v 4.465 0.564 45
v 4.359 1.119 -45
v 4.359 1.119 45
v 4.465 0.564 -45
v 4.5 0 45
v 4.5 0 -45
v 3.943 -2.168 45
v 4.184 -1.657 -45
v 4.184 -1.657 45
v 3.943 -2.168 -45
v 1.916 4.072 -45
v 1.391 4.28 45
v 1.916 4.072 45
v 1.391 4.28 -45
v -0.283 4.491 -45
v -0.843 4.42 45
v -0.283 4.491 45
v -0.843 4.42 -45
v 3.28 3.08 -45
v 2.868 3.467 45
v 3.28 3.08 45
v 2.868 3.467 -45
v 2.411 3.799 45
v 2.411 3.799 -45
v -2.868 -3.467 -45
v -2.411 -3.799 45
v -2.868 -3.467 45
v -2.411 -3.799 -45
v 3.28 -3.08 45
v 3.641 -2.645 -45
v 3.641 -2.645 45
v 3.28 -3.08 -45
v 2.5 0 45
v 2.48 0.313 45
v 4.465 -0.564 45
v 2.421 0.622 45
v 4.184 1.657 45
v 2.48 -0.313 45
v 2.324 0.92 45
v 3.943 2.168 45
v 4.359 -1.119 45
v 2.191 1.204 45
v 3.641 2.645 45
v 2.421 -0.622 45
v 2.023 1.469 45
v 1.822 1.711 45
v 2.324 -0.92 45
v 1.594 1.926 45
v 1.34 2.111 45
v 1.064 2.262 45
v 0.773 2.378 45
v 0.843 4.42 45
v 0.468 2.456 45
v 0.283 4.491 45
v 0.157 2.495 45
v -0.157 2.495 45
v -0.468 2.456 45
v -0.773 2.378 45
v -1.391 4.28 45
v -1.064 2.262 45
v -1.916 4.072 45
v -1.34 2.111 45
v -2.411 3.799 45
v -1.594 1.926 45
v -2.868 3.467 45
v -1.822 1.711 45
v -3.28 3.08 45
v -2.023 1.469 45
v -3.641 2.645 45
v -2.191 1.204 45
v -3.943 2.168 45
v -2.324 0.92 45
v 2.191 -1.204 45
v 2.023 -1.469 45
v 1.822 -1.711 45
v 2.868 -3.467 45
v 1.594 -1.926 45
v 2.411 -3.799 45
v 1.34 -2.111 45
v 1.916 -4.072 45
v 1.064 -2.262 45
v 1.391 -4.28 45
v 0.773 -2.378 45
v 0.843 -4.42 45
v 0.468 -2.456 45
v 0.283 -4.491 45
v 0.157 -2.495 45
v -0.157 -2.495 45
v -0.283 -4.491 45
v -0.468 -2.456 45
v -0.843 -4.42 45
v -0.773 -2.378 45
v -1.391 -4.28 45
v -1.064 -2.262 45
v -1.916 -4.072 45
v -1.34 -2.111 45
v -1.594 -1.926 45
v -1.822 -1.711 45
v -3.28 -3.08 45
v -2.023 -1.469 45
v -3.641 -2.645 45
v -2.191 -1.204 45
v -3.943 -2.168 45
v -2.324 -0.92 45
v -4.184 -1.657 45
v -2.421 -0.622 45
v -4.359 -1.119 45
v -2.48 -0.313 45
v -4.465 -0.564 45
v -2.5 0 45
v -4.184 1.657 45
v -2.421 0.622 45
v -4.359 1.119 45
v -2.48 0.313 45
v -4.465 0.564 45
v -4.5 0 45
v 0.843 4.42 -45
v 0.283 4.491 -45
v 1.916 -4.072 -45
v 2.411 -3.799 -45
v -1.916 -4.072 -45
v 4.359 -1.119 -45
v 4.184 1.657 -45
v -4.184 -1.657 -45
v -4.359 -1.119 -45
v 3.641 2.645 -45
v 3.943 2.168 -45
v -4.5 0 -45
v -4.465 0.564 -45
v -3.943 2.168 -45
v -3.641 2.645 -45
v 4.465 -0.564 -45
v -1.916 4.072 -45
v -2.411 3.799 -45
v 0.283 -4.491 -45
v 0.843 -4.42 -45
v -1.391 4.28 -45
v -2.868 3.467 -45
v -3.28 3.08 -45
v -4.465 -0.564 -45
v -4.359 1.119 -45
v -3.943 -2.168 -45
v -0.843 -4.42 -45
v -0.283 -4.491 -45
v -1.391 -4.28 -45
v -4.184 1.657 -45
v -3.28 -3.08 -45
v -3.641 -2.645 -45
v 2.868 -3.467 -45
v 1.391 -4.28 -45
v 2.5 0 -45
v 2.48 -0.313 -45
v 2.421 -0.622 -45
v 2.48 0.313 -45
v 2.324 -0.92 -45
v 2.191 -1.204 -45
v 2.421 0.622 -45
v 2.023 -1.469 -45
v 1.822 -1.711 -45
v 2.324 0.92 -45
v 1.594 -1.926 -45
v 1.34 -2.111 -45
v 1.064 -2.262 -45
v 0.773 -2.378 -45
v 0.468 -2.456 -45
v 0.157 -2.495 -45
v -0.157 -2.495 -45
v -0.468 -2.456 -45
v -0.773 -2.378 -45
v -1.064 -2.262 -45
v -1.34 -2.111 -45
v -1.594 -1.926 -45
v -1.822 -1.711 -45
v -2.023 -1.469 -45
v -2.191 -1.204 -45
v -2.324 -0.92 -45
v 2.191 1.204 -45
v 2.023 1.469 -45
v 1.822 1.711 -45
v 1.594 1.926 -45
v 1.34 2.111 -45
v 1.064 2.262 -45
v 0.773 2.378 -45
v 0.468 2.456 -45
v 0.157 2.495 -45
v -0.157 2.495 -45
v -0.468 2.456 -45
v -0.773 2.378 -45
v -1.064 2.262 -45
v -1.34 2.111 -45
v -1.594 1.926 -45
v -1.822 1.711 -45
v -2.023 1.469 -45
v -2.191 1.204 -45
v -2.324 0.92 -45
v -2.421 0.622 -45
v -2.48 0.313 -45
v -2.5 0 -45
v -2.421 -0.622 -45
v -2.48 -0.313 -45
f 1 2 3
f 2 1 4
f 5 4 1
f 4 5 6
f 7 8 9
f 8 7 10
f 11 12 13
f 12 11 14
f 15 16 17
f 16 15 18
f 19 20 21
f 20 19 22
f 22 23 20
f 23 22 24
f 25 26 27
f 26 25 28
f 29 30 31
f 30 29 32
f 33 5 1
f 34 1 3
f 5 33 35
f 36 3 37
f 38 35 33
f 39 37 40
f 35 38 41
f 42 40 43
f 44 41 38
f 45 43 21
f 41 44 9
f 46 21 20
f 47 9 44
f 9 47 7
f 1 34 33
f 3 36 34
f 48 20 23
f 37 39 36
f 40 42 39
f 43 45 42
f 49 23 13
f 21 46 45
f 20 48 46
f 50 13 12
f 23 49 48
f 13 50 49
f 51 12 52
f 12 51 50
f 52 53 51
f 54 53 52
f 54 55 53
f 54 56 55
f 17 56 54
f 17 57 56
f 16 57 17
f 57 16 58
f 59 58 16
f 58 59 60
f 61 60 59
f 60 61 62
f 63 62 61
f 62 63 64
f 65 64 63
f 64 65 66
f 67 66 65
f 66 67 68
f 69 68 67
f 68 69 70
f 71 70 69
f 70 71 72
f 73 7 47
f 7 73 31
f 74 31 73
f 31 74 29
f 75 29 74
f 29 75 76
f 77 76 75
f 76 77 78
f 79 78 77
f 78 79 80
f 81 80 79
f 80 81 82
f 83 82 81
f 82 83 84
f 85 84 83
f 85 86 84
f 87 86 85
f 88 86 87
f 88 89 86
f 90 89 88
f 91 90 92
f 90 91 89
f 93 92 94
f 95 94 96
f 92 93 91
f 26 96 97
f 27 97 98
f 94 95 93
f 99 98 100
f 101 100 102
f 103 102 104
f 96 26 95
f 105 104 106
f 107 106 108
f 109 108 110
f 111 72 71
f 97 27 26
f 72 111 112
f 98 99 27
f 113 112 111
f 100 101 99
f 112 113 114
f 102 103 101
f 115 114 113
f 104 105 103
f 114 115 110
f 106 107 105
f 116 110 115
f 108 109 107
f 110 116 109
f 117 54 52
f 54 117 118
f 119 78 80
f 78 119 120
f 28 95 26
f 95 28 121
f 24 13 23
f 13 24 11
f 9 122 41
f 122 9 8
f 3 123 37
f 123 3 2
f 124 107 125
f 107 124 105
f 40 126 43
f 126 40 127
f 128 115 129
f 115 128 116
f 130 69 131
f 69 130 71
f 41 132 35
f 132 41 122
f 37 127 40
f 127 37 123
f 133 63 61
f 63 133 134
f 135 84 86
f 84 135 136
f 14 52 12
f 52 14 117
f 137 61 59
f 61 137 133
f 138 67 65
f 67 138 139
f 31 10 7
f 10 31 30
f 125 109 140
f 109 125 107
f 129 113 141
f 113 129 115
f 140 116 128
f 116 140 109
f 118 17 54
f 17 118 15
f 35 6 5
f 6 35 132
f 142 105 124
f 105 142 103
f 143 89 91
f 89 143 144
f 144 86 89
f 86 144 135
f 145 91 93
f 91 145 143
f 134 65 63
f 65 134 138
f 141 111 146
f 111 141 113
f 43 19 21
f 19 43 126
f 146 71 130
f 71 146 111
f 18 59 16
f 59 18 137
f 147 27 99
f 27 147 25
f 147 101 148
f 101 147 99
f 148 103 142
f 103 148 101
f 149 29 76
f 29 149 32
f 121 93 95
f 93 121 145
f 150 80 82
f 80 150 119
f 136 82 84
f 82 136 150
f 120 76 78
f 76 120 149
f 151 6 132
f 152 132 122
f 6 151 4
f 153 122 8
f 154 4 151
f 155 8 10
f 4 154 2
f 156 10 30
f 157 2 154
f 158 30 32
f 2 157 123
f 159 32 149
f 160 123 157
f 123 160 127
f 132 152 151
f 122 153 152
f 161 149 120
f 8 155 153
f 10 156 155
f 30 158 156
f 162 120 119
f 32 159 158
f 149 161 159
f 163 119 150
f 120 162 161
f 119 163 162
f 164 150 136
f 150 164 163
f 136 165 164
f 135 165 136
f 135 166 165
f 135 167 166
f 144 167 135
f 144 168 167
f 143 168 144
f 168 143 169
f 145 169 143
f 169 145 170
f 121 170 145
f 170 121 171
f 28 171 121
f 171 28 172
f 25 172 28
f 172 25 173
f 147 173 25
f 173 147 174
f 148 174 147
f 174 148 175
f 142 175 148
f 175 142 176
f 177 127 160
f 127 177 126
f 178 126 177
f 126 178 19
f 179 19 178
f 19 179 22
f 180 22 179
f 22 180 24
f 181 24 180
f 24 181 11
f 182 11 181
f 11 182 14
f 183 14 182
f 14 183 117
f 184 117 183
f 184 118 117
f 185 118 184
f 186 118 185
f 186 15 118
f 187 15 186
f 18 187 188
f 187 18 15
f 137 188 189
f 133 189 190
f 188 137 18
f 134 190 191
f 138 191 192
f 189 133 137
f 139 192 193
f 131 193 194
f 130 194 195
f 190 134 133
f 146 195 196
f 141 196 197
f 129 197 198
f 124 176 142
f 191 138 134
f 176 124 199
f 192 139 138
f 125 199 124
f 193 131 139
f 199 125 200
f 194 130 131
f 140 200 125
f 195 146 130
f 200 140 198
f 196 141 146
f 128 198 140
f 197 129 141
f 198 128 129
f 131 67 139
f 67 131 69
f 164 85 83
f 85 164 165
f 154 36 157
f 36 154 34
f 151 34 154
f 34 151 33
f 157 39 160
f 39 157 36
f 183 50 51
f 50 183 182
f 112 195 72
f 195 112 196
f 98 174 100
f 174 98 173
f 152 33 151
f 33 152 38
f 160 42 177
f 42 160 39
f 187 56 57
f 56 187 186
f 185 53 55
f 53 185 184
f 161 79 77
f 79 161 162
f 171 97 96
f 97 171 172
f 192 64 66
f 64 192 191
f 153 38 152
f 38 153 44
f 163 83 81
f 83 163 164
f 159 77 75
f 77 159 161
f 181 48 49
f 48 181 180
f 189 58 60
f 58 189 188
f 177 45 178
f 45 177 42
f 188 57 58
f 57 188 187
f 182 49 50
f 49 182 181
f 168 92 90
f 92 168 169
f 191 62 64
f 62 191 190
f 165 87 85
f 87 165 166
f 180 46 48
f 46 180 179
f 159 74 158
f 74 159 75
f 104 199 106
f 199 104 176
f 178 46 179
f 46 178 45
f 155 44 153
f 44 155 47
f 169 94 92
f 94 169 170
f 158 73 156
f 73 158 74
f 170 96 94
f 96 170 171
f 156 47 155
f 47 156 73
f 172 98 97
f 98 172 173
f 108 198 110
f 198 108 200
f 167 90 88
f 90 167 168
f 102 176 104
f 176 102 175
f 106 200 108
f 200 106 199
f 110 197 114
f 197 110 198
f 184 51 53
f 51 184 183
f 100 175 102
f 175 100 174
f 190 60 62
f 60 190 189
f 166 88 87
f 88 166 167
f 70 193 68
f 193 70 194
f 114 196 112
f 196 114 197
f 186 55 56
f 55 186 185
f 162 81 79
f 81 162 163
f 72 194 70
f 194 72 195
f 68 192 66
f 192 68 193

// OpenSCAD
$fn = 50;


difference() {
	union() {
		translate(v = [0, 0, -45.0000000000]) {
			cylinder(h = 90, r = 4.5000000000);
		}
	}
	union() {
		translate(v = [0, 0, -100.0000000000]) {
			cylinder(h = 200, r = 2.5000000000);
		}
	}
}
